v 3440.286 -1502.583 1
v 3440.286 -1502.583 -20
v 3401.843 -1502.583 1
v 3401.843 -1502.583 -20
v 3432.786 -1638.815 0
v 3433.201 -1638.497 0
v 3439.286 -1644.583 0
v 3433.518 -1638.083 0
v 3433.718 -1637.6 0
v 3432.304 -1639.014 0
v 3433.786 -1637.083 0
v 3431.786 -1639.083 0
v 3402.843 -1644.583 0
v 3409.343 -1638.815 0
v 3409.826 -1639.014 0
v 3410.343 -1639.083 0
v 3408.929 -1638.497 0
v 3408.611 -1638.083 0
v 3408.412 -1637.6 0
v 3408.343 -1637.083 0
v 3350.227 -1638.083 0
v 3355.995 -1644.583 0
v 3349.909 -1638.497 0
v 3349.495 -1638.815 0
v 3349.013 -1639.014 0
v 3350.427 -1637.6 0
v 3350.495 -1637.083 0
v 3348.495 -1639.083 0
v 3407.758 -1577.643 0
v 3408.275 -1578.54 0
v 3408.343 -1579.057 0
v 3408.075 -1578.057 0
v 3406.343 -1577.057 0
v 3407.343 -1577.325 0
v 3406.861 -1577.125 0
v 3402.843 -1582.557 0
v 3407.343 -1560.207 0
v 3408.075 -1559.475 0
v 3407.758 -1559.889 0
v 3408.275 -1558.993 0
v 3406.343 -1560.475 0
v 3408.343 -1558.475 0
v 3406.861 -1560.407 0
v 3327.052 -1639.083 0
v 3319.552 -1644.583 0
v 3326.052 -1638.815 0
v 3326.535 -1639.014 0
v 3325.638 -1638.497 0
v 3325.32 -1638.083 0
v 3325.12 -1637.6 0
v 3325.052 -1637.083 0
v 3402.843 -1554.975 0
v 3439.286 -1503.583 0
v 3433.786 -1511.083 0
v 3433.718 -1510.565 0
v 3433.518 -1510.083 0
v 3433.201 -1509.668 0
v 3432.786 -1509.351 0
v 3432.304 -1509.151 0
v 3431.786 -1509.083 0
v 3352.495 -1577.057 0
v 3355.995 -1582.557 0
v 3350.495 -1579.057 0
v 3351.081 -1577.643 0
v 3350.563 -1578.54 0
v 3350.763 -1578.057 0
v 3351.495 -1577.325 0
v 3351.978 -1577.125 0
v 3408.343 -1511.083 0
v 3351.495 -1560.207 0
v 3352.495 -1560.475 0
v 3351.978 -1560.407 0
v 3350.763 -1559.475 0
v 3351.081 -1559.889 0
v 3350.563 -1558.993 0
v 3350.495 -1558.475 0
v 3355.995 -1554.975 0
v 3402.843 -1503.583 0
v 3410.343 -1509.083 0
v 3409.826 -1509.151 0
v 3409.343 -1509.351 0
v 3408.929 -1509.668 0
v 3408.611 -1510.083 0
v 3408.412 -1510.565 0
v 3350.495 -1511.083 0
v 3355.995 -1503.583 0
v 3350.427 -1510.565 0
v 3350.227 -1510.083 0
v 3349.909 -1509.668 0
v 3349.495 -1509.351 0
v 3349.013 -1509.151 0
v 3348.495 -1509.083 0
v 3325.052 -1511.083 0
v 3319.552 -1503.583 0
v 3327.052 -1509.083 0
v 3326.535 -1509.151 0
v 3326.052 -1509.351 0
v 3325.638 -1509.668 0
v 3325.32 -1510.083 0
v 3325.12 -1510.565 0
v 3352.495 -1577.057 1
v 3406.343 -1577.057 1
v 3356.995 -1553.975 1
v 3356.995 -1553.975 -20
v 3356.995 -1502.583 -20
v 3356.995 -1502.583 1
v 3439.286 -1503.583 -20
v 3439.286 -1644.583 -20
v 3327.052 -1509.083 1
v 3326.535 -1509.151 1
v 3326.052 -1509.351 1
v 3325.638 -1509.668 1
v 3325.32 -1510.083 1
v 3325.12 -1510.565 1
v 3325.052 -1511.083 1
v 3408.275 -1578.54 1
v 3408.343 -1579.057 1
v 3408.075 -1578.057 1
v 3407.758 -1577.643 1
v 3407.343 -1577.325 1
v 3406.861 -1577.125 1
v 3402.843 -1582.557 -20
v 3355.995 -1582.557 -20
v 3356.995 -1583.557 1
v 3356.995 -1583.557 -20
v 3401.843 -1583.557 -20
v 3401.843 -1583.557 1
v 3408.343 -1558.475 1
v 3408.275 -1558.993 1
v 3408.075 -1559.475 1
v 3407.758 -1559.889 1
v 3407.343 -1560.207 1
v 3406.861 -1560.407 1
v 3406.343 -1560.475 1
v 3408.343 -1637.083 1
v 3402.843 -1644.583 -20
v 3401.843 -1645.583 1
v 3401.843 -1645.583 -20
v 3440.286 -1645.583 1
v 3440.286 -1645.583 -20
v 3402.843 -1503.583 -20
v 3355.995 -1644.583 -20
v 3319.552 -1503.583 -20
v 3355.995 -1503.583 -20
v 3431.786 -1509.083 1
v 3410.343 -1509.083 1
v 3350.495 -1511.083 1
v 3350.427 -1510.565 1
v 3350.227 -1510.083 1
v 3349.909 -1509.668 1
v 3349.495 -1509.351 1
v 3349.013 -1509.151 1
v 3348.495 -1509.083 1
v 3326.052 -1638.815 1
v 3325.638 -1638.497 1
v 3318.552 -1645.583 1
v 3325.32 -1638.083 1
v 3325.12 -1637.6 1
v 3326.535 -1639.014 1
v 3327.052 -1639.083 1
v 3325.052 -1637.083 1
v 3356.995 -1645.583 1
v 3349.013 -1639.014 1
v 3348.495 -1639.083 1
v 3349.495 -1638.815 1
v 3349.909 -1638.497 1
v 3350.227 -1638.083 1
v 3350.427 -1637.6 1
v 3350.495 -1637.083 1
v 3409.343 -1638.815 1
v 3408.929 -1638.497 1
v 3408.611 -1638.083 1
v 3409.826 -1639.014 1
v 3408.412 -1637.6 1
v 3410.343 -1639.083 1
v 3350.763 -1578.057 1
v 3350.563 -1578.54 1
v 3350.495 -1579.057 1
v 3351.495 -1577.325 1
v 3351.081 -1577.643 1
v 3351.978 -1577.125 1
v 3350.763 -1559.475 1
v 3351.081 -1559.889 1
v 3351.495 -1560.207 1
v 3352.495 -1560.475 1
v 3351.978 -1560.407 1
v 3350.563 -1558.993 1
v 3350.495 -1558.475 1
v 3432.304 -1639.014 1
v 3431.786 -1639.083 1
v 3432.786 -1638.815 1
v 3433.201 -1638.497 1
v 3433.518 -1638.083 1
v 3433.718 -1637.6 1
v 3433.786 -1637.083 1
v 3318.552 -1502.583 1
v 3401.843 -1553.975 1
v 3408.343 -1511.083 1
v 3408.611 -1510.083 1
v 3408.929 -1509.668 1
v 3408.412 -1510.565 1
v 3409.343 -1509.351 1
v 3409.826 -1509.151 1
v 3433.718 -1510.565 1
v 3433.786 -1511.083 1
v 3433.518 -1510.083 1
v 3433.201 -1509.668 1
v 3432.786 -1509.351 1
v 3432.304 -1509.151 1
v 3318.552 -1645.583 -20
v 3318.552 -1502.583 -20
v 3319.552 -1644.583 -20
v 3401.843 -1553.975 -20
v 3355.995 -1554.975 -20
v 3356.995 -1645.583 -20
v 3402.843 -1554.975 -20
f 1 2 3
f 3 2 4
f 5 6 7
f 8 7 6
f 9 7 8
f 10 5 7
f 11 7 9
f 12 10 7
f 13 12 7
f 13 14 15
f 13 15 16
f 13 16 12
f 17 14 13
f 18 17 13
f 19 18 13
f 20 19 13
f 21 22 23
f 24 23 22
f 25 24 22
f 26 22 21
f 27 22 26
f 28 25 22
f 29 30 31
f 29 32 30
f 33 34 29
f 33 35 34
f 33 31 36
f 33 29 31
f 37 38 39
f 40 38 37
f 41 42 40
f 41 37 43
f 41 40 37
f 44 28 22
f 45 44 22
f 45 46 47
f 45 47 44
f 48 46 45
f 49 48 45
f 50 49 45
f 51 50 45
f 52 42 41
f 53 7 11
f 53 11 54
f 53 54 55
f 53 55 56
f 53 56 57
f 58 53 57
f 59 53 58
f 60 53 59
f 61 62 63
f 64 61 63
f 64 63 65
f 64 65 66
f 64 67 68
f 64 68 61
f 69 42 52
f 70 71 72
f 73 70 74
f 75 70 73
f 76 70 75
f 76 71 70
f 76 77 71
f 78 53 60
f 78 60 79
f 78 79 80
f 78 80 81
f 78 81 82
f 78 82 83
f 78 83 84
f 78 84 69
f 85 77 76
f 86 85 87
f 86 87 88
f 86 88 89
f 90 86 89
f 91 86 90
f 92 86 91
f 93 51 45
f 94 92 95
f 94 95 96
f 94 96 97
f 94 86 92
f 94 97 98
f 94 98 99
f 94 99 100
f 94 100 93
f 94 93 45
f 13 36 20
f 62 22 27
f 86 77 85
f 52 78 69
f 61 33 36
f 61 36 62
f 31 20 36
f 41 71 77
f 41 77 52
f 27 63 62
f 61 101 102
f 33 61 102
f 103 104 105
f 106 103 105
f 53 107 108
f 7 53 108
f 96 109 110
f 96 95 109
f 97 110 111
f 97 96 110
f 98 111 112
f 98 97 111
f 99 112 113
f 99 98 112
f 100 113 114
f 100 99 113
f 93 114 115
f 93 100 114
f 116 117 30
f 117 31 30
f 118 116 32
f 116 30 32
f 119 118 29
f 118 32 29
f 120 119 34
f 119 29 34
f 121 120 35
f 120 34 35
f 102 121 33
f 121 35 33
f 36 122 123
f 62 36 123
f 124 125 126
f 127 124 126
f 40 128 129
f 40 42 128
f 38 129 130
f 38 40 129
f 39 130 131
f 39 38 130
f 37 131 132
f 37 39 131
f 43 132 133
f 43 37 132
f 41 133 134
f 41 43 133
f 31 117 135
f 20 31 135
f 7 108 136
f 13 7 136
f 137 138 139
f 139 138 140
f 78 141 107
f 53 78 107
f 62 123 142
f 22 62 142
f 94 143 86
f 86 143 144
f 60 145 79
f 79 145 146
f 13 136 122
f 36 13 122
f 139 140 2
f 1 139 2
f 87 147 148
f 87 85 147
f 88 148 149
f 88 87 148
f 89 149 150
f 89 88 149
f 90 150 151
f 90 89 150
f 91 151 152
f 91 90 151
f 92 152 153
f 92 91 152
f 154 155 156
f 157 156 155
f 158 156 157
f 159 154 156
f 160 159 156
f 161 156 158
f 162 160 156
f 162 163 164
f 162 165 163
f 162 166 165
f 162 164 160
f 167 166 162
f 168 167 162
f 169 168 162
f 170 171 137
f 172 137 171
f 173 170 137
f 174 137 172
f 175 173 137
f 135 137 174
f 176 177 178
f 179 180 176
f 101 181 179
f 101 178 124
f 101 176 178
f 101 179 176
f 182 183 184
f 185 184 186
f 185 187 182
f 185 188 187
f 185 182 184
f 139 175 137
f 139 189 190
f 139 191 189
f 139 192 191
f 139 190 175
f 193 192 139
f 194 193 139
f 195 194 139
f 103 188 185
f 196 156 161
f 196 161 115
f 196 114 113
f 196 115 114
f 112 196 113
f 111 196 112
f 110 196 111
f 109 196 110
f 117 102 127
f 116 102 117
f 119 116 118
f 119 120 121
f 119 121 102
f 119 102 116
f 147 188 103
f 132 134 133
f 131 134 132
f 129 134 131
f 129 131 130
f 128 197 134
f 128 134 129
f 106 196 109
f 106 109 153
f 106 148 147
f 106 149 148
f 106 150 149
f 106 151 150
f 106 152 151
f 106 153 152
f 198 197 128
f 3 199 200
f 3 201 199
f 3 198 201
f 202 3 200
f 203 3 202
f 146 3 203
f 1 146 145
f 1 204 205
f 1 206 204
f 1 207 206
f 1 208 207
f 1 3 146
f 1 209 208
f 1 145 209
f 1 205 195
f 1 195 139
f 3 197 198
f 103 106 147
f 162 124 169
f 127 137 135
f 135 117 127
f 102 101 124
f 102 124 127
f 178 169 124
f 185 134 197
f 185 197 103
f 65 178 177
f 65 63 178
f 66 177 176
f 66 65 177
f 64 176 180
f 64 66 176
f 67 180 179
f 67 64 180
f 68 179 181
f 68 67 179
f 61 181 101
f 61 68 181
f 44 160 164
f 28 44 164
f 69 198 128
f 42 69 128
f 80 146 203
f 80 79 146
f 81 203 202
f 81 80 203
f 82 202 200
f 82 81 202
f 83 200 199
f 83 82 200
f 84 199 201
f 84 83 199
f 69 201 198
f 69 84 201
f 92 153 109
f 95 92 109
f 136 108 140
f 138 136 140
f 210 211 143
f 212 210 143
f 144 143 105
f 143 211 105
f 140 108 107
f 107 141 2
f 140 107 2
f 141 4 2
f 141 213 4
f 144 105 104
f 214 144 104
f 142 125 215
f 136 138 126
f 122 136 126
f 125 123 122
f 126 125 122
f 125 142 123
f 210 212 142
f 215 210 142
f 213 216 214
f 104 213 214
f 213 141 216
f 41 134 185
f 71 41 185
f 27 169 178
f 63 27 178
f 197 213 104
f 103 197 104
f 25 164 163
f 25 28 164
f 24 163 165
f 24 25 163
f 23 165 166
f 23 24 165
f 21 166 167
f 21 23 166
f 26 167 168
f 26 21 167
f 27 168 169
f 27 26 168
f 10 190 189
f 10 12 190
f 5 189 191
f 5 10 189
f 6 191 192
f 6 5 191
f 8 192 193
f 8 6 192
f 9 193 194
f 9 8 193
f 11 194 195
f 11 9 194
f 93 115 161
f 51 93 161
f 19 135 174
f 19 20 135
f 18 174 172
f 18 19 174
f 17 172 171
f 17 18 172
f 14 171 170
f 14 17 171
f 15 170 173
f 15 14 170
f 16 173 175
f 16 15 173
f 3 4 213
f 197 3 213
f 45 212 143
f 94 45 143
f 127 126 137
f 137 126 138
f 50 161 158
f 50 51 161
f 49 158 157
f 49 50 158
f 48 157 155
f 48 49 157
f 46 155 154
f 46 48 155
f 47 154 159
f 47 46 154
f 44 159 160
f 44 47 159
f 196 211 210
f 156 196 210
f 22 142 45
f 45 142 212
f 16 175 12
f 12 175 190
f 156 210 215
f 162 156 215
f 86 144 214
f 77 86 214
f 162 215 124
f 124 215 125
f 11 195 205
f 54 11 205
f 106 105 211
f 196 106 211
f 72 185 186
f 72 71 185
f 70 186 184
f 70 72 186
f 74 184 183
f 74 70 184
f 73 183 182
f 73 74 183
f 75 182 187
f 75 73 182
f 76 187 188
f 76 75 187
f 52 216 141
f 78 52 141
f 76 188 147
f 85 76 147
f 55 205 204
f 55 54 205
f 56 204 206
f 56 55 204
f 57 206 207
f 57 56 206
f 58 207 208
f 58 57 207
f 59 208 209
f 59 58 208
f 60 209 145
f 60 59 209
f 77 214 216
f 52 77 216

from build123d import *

# Parameters (mm, degrees)
BOSS_EXTRUDE1_DEPTH      = 1
BOSS_EXTRUDE1_DEPTH_BACK = 20
CUT_EXTRUDE1_DEPTH       = 3814.653559302
CUT_EXTRUDE2_DEPTH       = 20
FILLET1_R                = 2


with BuildPart() as part:
    # Sketch1 → Boss-Extrude1 (new, two sides: drawn at the far end of the back side and taken through both)
    with BuildSketch(Plane.XY.offset(-BOSS_EXTRUDE1_DEPTH_BACK)):
        Polygon((3401.843352704, -1645.582577839), (3440.286390679, -1645.582577839), (3440.286390679, -1502.582577839), (3401.843352704, -1502.582577839), (3401.843352704, -1553.974982902), (3356.995251438, -1553.974982902), (3356.995251438, -1502.582577839), (3318.552213464, -1502.582577839), (3318.552213464, -1645.582577839), (3356.995251438, -1645.582577839), (3356.995251438, -1583.557261383), (3401.843352704, -1583.557261383), align=None)
    extrude(amount=BOSS_EXTRUDE1_DEPTH + BOSS_EXTRUDE1_DEPTH_BACK)

    # Sketch2 → Cut-Extrude1 (cut, through all)
    with BuildSketch(Plane.XY.offset(1)):
        Polygon((3408.343352704, -1577.057261383), (3408.343352704, -1639.082577839), (3433.786390679, -1639.082577839), (3433.786390679, -1509.082577839), (3408.343352704, -1509.082577839), (3408.343352704, -1560.474982902), (3350.495251438, -1560.474982902), (3350.495251438, -1509.082577839), (3325.052213464, -1509.082577839), (3325.052213464, -1639.082577839), (3350.495251438, -1639.082577839), (3350.495251438, -1577.057261383), align=None)
    extrude(amount=-CUT_EXTRUDE1_DEPTH, mode=Mode.SUBTRACT)

    # Sketch3 → Cut-Extrude2 (cut)
    with BuildSketch(Plane(origin=(0, 0, -20), x_dir=(-1, 0, 0), z_dir=(0, 0, -1))):
        Polygon((-3402.843352704, -1644.582577839), (-3402.843352704, -1582.557261383), (-3355.995251438, -1582.557261383), (-3355.995251438, -1644.582577839), (-3319.552213464, -1644.582577839), (-3319.552213464, -1503.582577839), (-3355.995251438, -1503.582577839), (-3355.995251438, -1554.974982902), (-3402.843352704, -1554.974982902), (-3402.843352704, -1503.582577839), (-3439.286390679, -1503.582577839), (-3439.286390679, -1644.582577839), align=None)
    extrude(amount=-CUT_EXTRUDE2_DEPTH, mode=Mode.SUBTRACT)

    # Fillet1
    fillet1_edges = [part.edges().sort_by_distance(p)[0] for p in [
        (3408.343352704, -1639.082577839, 0.5),
        (3408.343352704, -1577.057261383, 0.5),
        (3433.786390679, -1639.082577839, 0.5),
        (3433.786390679, -1509.082577839, 0.5),
        (3408.343352704, -1509.082577839, 0.5),
        (3408.343352704, -1560.474982902, 0.5),
        (3350.495251438, -1560.474982902, 0.5),
        (3350.495251438, -1509.082577839, 0.5),
        (3325.052213464, -1509.082577839, 0.5),
        (3325.052213464, -1639.082577839, 0.5),
        (3350.495251438, -1639.082577839, 0.5),
        (3350.495251438, -1577.057261383, 0.5),
    ]]
    fillet(fillet1_edges, radius=FILLET1_R)


solid = part.part
